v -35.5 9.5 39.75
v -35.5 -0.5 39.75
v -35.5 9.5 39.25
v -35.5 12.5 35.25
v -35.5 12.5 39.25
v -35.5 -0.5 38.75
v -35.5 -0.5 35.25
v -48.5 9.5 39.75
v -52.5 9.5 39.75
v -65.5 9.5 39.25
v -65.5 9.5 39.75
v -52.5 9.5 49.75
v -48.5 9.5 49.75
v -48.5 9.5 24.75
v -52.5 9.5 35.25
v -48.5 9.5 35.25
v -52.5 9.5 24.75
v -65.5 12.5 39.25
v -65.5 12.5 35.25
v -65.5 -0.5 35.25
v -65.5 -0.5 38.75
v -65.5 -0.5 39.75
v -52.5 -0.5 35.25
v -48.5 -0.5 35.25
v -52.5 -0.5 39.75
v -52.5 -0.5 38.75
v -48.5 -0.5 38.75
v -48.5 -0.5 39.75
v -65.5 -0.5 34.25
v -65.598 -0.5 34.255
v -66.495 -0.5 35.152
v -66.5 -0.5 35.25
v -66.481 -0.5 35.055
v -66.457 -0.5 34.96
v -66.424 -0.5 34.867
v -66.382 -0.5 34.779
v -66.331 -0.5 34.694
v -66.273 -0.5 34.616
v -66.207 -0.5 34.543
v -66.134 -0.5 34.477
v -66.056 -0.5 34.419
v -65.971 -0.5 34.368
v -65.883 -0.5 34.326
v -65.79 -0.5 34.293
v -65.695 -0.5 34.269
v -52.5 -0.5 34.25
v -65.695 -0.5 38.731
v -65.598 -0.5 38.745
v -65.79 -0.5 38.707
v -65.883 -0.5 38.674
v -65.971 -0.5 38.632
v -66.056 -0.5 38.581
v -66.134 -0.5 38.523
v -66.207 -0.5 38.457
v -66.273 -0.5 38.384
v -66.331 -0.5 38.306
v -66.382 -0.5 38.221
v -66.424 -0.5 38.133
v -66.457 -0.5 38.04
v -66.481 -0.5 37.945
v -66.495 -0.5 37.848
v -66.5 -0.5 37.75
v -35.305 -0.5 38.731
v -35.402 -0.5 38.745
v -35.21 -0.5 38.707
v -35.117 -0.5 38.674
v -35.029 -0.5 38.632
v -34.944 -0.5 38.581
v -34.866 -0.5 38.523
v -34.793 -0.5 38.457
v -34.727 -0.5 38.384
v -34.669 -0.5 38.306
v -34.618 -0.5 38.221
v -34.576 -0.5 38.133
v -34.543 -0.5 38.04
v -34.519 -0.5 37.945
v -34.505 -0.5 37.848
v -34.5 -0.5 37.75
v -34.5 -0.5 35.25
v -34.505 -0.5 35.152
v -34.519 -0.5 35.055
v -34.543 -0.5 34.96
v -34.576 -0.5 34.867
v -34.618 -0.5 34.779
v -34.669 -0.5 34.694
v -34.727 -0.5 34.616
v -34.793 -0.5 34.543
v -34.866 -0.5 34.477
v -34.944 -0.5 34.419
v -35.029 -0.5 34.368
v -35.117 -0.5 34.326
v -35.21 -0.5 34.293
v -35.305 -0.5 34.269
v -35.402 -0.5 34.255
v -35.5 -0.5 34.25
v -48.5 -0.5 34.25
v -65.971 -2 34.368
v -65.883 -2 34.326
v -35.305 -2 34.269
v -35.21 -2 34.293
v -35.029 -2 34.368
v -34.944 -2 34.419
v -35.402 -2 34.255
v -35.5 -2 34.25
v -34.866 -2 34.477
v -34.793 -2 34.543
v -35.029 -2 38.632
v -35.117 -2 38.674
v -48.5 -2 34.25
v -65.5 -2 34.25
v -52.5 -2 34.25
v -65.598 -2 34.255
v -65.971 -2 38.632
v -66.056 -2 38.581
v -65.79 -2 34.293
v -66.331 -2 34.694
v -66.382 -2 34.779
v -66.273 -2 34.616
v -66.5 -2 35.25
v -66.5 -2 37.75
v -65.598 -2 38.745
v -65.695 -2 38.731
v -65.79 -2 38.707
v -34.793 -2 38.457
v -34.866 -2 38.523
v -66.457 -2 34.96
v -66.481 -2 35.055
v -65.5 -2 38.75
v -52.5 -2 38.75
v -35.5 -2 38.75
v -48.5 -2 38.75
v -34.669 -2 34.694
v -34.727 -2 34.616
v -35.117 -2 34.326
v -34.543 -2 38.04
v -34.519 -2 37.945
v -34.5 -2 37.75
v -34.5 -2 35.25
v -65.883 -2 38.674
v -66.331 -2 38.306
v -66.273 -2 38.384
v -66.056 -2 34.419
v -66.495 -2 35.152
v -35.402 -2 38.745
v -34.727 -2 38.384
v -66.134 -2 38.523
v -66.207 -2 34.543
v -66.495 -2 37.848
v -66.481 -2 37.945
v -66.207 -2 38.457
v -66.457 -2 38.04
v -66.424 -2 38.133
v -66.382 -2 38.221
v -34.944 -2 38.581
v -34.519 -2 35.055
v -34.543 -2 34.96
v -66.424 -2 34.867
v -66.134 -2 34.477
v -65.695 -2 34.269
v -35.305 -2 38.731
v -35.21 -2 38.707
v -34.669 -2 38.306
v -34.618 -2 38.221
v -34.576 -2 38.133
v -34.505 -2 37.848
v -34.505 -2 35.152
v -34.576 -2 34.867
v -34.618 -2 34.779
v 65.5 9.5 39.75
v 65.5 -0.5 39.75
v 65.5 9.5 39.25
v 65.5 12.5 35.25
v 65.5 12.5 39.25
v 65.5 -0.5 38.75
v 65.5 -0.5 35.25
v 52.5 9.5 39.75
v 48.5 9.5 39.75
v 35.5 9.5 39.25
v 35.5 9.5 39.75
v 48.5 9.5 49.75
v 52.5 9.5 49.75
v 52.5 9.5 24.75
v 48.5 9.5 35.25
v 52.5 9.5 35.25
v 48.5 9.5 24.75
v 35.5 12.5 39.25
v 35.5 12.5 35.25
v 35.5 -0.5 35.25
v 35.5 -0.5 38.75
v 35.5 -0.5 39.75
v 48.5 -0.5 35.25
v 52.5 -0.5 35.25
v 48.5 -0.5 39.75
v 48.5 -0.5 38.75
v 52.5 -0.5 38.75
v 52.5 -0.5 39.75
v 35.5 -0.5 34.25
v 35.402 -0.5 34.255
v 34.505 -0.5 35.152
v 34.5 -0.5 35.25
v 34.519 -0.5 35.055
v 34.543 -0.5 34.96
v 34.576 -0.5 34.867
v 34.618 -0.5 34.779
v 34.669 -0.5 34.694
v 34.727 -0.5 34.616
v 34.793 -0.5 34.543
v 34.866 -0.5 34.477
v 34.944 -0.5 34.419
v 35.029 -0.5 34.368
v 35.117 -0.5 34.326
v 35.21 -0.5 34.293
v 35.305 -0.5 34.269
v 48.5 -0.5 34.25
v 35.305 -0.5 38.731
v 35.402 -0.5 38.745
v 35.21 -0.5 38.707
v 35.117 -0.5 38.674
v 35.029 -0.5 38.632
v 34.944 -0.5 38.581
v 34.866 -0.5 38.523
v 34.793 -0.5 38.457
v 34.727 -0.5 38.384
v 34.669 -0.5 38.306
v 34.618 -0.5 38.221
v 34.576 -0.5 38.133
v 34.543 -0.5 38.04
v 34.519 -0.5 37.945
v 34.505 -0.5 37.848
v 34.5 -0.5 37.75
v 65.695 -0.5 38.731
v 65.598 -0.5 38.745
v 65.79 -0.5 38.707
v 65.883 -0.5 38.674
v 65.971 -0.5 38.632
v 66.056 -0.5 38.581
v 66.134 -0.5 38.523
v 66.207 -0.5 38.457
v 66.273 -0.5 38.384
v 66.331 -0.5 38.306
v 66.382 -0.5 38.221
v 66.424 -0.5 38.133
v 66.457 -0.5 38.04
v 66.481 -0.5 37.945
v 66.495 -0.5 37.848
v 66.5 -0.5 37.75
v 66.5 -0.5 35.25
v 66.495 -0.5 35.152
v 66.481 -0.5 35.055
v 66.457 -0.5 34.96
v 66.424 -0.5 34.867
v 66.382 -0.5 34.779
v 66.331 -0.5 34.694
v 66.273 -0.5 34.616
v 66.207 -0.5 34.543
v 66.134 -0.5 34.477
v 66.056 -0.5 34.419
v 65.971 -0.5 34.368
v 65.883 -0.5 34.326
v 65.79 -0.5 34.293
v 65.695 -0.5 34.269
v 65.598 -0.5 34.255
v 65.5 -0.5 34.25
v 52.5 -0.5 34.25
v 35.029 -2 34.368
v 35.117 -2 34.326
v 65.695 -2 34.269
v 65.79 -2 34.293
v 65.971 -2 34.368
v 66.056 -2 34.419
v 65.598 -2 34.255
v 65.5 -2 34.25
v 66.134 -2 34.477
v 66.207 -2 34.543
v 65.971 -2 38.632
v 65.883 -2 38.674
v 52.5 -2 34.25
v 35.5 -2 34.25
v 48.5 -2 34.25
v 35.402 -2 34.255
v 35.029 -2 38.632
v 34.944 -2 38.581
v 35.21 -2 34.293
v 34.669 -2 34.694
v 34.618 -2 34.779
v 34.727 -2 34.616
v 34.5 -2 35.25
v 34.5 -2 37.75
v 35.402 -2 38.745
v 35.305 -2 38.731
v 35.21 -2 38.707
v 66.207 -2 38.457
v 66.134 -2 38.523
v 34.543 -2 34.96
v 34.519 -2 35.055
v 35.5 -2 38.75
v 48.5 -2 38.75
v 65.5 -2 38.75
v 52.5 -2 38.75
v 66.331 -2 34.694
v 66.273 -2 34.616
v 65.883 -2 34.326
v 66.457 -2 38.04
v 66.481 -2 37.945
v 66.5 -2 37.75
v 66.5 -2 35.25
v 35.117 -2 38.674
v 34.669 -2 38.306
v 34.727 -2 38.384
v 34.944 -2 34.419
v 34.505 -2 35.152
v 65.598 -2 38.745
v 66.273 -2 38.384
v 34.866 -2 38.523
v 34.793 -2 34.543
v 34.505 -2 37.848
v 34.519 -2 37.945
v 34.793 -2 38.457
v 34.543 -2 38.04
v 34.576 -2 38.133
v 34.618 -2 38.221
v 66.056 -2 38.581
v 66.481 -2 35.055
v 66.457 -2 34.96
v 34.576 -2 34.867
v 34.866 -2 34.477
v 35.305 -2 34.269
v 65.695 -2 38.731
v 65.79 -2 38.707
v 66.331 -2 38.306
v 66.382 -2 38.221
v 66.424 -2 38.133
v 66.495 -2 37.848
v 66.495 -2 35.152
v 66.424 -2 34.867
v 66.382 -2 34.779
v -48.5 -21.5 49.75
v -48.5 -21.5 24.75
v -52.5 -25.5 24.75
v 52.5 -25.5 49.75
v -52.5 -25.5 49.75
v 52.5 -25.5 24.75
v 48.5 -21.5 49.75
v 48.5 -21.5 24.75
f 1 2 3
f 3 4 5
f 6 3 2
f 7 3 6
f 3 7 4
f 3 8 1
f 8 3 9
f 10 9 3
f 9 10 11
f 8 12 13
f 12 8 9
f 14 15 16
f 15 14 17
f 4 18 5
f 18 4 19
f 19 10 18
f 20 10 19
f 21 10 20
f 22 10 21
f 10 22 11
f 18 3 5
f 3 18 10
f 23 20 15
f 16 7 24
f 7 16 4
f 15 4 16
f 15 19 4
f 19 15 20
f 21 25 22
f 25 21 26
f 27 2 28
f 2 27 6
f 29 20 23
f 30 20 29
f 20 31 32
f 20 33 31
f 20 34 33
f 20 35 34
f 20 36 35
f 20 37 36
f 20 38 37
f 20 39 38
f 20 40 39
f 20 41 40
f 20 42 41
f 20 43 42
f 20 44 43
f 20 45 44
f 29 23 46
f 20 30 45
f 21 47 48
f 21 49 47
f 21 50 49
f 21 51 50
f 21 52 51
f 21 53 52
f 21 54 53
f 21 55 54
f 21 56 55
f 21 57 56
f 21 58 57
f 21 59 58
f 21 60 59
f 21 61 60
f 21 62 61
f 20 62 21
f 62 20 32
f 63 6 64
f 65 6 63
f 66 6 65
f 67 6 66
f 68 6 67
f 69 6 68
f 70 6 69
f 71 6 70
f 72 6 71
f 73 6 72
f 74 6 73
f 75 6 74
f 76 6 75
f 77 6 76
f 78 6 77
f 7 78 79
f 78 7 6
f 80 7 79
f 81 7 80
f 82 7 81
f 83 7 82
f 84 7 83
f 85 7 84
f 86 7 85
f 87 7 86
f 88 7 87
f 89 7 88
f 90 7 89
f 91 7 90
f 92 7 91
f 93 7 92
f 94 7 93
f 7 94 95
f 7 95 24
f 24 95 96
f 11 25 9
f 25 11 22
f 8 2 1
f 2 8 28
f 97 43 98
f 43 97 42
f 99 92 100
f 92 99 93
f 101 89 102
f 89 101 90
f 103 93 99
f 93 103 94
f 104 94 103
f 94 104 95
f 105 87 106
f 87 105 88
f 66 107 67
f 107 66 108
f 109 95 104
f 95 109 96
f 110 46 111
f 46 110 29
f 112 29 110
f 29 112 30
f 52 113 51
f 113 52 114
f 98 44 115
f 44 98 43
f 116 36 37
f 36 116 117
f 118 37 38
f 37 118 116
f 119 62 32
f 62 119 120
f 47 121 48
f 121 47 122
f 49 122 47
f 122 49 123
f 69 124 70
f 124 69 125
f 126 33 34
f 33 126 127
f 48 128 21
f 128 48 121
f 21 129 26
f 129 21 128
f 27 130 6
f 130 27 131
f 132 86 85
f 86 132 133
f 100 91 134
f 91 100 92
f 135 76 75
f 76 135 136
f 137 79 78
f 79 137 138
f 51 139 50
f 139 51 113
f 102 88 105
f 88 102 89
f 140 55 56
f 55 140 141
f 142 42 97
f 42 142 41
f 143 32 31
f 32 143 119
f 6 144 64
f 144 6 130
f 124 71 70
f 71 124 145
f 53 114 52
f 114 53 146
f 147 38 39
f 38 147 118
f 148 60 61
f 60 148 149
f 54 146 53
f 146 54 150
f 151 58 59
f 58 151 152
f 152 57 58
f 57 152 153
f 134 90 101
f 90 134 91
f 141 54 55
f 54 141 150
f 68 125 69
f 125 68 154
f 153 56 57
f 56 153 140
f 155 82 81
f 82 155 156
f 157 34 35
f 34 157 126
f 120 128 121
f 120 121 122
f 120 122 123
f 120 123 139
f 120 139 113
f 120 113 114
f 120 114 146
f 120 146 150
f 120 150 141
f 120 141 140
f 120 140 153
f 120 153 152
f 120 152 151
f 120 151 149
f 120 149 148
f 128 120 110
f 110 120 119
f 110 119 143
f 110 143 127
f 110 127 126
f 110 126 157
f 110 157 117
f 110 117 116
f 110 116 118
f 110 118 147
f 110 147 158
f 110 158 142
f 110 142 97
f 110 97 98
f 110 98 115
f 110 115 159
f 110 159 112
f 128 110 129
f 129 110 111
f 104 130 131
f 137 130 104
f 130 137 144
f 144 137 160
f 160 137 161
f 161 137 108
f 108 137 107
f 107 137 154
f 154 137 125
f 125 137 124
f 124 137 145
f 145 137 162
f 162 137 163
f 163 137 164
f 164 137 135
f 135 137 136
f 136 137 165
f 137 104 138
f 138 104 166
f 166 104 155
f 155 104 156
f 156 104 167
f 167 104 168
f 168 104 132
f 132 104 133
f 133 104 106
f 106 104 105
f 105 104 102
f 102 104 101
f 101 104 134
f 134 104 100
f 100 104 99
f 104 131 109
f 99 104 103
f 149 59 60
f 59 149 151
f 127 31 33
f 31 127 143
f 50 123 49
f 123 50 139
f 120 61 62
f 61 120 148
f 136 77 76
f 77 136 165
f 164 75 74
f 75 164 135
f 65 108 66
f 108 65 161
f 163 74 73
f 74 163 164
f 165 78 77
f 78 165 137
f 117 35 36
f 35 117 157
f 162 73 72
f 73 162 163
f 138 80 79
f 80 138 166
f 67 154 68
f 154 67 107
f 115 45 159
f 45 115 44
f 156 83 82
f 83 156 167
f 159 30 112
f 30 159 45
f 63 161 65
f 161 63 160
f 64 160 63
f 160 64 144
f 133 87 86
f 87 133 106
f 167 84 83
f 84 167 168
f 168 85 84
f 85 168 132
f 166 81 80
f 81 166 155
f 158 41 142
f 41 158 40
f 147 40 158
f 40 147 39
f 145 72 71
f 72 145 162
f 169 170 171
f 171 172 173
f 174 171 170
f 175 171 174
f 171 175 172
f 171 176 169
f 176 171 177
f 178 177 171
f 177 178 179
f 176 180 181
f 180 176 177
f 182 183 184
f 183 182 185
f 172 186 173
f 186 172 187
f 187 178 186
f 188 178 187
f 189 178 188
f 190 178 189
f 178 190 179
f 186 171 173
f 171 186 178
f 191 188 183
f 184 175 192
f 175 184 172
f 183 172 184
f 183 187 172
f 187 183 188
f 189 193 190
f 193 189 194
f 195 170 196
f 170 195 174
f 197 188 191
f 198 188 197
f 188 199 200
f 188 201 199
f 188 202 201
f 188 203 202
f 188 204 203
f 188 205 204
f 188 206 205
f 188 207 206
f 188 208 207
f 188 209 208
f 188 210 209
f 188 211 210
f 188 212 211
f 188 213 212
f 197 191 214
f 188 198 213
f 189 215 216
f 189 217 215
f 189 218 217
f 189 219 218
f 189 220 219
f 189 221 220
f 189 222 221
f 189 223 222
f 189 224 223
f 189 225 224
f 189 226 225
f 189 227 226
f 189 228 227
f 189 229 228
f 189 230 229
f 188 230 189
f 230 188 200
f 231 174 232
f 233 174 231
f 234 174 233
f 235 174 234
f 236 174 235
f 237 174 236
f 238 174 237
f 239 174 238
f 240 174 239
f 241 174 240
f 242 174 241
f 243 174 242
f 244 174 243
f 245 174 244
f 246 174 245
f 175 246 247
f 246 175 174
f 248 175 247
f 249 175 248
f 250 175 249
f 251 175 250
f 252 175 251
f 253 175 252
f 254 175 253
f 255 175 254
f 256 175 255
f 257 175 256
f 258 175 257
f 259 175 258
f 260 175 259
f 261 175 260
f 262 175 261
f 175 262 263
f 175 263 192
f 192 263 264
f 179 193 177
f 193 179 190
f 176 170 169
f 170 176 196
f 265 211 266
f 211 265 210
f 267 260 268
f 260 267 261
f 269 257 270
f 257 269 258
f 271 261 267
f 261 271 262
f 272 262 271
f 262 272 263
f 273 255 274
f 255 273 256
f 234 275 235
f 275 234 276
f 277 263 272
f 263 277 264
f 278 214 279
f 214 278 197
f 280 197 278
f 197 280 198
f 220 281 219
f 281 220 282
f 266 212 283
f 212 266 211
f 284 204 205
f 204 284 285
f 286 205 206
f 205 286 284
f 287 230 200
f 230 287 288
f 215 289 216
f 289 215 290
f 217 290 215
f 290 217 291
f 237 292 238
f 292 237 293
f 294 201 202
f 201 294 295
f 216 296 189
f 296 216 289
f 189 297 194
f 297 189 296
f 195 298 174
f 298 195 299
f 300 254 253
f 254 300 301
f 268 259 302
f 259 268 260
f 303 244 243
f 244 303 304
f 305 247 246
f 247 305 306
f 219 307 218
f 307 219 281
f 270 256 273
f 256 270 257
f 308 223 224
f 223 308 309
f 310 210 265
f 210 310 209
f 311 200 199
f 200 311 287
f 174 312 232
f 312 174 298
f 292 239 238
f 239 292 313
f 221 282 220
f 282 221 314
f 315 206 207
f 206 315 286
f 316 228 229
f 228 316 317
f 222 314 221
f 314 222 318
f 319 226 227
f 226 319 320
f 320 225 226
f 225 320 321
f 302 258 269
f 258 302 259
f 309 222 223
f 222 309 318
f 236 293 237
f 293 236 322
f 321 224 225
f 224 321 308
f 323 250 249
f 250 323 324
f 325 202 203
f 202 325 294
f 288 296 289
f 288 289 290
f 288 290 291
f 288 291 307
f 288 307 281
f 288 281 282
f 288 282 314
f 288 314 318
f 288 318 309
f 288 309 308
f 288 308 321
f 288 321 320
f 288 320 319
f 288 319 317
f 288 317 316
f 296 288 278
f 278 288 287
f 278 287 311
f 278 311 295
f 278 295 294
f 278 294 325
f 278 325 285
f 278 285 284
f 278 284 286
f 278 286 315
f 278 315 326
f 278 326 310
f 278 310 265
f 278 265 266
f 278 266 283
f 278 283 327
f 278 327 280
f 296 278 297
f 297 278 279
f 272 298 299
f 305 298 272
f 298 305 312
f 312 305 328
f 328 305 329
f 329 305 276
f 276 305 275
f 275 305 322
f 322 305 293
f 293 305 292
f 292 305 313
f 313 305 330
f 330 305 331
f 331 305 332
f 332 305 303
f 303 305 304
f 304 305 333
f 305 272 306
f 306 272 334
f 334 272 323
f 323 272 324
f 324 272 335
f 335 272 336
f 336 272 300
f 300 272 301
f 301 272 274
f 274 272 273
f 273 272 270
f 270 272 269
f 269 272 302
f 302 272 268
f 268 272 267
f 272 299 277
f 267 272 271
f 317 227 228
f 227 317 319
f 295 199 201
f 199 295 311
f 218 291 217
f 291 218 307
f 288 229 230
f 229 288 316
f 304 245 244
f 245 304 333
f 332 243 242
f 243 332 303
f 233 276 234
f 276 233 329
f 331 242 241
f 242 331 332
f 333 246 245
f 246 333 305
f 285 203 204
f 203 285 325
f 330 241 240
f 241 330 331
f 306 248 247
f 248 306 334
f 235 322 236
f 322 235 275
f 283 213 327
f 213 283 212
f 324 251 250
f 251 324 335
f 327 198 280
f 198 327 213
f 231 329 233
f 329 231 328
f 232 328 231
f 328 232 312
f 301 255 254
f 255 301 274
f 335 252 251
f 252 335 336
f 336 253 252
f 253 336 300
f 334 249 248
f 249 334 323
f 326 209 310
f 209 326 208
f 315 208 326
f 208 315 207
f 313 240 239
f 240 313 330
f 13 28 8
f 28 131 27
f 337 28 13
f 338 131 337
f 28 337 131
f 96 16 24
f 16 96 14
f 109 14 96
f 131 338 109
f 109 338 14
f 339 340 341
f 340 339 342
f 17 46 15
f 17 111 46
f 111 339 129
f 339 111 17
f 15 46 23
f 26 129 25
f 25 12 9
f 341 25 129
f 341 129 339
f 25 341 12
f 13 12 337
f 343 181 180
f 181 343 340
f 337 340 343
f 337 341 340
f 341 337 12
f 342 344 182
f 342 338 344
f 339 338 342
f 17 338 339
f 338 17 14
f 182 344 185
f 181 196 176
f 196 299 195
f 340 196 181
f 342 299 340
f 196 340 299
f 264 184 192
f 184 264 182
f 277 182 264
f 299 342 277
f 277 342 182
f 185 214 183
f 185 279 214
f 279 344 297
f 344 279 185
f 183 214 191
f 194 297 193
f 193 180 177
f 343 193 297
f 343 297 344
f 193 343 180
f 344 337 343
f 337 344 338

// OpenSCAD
// Apple TV Retention Strap (Standalone Design)
// Clips into rack shelf ventilation slots to secure Apple TV from above
// Print on its SIDE (no supports needed)
//
// This strap replaces the tray-based mount entirely. The Apple TV sits directly
// on the rack shelf, and this strap clips into the ventilation slots to hold it
// in place from above.
//
// Shelf specifications:
//   - Vent slot dimensions: 35.5mm x 5mm (from drawing)
//   - Slot spacing: 20mm center-to-center
//
// Apple TV 4K (3rd generation):
//   - Width: 93.0mm
//   - Depth: 93.0mm
//   - Height: 31.0mm

$fn = 64;

// ===== DESIGN PARAMETERS =====
APPLETV_WIDTH = 93.0;
APPLETV_DEPTH = 93.0;
APPLETV_HEIGHT = 31.0;
CLEARANCE = 2.0;  // Extra clearance since there's no tray

// Strap parameters
STRAP_WIDTH = 25.0;              // Width of the strap (thickness when printing on side)
STRAP_HEIGHT = 35.0;             // Height of arch over Apple TV
STRAP_THICKNESS = 4.0;           // Thickness of strap material (height when printing on side)
STRAP_SPAN = APPLETV_WIDTH + 2 * CLEARANCE;  // Distance between clip attachment points

// Clip parameters
SLOT_SPACING = 20.0;
CLIP_WIDTH = 30.0;               // Fits in 35.5mm slot
CLIP_THICKNESS = 4.5;            // Fits in 5mm slot with some flex
CLIP_HEIGHT = 10.0;              // Extends down through shelf
CLIP_BASE_HEIGHT = 3.0;          // Height of clip base attachment

// ===== HELPER MODULES =====

// Clip tab that goes through ventilation slot
module clip_tab() {
    union() {
        // Base attachment area (connects to strap)
        translate([0, 0, 0])
        cube([CLIP_WIDTH, STRAP_THICKNESS, CLIP_BASE_HEIGHT]);

        // Main vertical part that goes through slot
        translate([0, 0, CLIP_BASE_HEIGHT])
        cube([CLIP_WIDTH, CLIP_THICKNESS, CLIP_HEIGHT]);

        // Small hook at bottom for retention
        translate([0, 0, CLIP_BASE_HEIGHT + CLIP_HEIGHT])
        linear_extrude(height=1.5)
        offset(r=1)
        square([CLIP_WIDTH, CLIP_THICKNESS - 2], center=false);
    }
}

// Main strap assembly
module retention_strap() {
    union() {
        // Two vertical legs with integrated clips at bottom
        leg_width = STRAP_THICKNESS;
        leg_height = STRAP_HEIGHT;

        // Left leg - starts from top of clip base
        translate([-STRAP_SPAN/2 - leg_width, 0, CLIP_BASE_HEIGHT])
        cube([leg_width, STRAP_WIDTH, leg_height]);

        // Right leg - starts from top of clip base
        translate([STRAP_SPAN/2, 0, CLIP_BASE_HEIGHT])
        cube([leg_width, STRAP_WIDTH, leg_height]);

        // Top crossbar connecting the legs
        translate([-STRAP_SPAN/2 - leg_width, 0, leg_height + CLIP_BASE_HEIGHT - STRAP_THICKNESS])
        cube([STRAP_SPAN + 2*leg_width, STRAP_WIDTH, STRAP_THICKNESS]);

        // Clip tabs at BOTTOM of each leg (where they touch the shelf)
        // Left clip - at base of left leg
        translate([-STRAP_SPAN/2 - leg_width + (leg_width - CLIP_WIDTH)/2, (STRAP_WIDTH - STRAP_THICKNESS)/2, 0])
        clip_tab();

        // Right clip - at base of right leg
        translate([STRAP_SPAN/2 + (leg_width - CLIP_WIDTH)/2, (STRAP_WIDTH - STRAP_THICKNESS)/2, 0])
        clip_tab();
    }
}

// ===== MAIN ASSEMBLY =====
// Print orientation: ON ITS SIDE (rotate 90° around Y axis)
module retention_strap_print_orientation() {
    leg_width = STRAP_THICKNESS;
    leg_height = STRAP_HEIGHT + CLIP_BASE_HEIGHT + CLIP_HEIGHT + 1.5;  // Include full clip height

    // Rotate 90° and translate to sit properly on build plate
    translate([0, STRAP_WIDTH/2, leg_height/2])
    rotate([90, 0, 0])
    retention_strap();
}

retention_strap_print_orientation();
